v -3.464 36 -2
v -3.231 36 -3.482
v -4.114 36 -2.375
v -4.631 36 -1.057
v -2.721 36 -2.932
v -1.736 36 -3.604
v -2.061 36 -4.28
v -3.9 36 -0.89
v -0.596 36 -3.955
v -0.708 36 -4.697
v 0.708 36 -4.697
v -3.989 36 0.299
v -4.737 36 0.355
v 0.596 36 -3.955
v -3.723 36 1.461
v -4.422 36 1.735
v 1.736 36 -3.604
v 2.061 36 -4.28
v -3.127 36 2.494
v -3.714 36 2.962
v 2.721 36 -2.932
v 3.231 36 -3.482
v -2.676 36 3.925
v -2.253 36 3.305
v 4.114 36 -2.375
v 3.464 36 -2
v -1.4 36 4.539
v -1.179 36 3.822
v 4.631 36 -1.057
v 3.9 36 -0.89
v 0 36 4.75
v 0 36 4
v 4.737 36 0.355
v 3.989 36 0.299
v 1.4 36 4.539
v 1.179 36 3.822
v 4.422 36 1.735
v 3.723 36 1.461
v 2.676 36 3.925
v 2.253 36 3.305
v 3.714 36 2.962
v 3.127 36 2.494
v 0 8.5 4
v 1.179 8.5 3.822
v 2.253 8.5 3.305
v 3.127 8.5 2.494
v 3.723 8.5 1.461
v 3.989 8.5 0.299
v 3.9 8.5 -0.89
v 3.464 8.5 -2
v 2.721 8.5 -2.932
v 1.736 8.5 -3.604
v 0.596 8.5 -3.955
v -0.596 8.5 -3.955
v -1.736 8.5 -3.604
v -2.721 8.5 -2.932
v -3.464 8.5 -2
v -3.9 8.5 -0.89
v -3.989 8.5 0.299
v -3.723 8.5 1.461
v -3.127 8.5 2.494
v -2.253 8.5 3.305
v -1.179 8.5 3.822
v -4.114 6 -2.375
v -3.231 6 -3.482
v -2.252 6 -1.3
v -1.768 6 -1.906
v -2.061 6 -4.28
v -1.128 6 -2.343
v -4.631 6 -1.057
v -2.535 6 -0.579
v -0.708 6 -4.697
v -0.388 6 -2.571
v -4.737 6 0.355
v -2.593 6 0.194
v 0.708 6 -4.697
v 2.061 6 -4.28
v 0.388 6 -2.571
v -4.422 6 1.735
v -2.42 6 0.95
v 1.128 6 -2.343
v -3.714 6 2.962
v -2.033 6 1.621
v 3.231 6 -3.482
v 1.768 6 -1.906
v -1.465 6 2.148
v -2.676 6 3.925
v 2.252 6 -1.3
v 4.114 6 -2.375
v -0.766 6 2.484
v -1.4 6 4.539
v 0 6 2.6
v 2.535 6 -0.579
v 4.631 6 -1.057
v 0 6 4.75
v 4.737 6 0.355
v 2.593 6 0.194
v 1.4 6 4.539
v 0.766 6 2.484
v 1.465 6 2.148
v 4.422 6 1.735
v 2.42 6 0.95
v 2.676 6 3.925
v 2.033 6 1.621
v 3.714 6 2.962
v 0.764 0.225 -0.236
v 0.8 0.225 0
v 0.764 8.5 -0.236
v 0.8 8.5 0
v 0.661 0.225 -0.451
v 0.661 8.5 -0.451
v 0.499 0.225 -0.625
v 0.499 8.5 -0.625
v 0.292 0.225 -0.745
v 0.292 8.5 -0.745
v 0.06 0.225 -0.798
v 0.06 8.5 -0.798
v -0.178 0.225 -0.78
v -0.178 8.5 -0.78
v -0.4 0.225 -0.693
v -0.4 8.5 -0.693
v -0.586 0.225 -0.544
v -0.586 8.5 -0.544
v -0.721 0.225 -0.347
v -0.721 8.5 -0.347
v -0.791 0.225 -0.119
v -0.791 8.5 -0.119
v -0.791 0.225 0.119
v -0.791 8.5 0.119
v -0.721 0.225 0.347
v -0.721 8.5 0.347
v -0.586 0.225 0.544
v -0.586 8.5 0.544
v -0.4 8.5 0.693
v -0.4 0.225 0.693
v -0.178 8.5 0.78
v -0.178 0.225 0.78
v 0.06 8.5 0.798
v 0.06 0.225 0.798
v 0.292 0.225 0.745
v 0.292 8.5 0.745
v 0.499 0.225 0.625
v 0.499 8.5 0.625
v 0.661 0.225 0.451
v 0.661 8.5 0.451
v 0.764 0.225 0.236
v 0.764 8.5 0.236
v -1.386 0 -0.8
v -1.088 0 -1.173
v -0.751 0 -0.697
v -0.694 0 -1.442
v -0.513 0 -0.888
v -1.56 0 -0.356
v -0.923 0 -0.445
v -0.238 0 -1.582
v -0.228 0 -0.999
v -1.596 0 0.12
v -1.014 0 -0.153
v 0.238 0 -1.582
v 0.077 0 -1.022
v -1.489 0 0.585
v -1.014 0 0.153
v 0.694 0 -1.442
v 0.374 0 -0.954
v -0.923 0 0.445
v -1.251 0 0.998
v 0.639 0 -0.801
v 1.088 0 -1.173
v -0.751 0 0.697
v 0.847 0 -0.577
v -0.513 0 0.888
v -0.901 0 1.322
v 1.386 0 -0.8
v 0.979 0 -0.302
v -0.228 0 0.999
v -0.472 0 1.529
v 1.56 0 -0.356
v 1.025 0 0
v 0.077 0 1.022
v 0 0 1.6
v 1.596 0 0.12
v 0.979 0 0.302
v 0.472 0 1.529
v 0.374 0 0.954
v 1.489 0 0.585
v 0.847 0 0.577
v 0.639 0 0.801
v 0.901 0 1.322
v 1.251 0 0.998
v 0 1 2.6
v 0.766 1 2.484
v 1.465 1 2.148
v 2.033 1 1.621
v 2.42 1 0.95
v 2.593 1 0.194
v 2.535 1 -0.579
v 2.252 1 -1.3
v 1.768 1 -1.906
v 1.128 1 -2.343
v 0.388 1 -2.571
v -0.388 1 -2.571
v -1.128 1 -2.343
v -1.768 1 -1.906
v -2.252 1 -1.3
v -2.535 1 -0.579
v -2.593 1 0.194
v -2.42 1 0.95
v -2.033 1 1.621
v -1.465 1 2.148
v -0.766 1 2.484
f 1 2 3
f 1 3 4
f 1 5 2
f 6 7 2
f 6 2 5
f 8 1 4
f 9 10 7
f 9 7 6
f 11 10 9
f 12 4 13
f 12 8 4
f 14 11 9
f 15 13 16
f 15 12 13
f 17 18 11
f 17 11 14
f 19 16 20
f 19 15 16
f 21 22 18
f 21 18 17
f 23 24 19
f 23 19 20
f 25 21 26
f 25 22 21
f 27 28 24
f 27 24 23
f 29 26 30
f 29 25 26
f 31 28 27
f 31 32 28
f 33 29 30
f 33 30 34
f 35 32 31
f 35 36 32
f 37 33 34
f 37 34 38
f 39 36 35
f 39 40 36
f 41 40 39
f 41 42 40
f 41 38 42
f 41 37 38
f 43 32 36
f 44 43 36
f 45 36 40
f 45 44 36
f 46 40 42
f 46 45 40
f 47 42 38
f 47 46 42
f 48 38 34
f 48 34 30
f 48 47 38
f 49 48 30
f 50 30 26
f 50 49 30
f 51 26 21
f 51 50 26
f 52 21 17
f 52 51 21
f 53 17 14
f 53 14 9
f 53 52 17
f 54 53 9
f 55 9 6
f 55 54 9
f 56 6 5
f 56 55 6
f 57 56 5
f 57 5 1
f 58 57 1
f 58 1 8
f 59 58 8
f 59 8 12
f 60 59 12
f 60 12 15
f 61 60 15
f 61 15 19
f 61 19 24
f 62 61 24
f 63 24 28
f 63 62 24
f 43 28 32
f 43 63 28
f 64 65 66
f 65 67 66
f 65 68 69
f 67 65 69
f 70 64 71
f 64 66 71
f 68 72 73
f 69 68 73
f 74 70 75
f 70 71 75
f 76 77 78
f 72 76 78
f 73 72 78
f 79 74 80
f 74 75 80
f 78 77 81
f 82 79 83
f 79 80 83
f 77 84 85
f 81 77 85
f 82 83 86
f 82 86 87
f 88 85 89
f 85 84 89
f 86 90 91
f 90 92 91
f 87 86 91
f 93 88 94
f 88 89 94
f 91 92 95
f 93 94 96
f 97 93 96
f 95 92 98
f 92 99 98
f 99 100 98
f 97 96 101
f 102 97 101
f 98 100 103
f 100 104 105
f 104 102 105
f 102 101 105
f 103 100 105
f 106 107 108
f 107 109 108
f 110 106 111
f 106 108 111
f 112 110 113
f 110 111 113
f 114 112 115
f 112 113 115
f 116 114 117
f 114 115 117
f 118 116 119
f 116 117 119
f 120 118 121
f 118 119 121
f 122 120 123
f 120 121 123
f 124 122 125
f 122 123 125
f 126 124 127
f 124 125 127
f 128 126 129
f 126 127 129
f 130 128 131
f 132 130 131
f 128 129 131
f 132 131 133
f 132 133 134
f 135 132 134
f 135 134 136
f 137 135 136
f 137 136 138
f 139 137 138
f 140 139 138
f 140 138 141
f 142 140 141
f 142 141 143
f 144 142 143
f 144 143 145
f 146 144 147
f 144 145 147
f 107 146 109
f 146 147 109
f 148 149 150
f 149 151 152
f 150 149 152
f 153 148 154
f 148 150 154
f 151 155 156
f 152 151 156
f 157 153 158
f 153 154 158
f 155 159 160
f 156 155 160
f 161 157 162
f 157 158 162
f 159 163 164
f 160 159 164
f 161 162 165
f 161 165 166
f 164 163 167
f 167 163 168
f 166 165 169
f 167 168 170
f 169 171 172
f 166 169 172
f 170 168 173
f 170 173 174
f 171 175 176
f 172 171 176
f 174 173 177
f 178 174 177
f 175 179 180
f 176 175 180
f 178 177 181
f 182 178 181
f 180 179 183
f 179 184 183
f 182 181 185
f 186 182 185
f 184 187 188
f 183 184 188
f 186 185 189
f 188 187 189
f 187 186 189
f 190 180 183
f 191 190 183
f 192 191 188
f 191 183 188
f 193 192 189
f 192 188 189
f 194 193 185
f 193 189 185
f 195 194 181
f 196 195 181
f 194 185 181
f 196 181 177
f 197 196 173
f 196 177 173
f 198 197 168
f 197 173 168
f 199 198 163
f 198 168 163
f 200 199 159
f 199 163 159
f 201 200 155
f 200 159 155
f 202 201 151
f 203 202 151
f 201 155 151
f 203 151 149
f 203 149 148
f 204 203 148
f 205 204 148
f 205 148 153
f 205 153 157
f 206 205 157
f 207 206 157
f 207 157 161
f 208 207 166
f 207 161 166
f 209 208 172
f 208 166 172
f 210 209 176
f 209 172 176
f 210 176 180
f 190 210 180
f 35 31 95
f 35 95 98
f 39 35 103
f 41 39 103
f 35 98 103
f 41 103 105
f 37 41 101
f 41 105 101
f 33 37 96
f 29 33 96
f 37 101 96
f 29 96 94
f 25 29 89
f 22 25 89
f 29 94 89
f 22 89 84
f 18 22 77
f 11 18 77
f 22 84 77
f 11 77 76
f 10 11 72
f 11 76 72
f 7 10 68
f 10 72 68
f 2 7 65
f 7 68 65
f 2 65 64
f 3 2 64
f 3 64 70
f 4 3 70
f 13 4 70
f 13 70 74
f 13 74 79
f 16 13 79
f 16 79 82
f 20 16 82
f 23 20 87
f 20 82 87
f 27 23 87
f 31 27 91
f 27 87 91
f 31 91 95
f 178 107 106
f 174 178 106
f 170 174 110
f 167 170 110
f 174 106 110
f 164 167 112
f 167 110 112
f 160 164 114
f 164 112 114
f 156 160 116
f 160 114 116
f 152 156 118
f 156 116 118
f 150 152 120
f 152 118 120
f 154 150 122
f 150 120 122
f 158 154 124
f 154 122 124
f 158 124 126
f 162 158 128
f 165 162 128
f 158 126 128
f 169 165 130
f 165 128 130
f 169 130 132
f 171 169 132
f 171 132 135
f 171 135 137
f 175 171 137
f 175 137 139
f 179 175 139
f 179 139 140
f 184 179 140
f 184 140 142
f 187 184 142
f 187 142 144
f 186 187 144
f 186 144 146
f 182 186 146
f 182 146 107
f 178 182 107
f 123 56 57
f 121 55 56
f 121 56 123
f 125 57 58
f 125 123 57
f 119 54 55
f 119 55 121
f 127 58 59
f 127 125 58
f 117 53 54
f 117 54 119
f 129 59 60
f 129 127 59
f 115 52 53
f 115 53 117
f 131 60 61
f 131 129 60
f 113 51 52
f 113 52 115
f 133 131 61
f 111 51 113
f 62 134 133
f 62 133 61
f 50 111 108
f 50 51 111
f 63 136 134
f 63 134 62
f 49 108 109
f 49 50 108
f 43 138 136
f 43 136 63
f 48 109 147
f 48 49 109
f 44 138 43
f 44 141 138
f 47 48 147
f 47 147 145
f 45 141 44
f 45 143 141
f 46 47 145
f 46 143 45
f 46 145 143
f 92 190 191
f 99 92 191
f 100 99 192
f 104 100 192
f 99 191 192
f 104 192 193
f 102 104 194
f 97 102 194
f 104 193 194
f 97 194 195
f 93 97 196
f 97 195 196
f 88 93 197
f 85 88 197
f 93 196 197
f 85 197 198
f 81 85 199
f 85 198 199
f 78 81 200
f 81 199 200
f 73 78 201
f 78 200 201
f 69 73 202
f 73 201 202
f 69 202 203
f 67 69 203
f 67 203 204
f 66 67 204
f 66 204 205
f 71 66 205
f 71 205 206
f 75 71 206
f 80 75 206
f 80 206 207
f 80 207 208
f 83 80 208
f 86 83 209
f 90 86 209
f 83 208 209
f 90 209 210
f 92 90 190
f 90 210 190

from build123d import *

# Parameters (mm, degrees)
SKETCH1_R                   = 2.6
BOSS_EXTRUDE1_DEPTH         = 6
SKETCH2_R                   = 4.75
BOSS_EXTRUDE3_DEPTH         = 2.5
SKETCH3_R                   = 4.75
SKETCH3_R_2                 = 4
BOSS_EXTRUDE4_DEPTH         = 27.5
M2_TAPPED_HOLE1_D           = 1.6
M2_TAPPED_HOLE1_CSINK_D     = 2.05
M2_TAPPED_HOLE1_CSINK_ANGLE = 90
CHAMFER3_SIZE               = 1


with BuildPart() as part:
    # Sketch1 → Boss-Extrude1 (new body)
    with BuildSketch(Plane(origin=(0, 0, 0), x_dir=(1, 0, 0), z_dir=(0, 1, 0))):
        with Locations(Location((0, 0, 0), (0, 0, 270))):
            Circle(SKETCH1_R)
    extrude(amount=BOSS_EXTRUDE1_DEPTH)

    # Sketch2 → Boss-Extrude3 (add)
    with BuildSketch(Plane(origin=(0, 6, 0), x_dir=(1, 0, 0), z_dir=(0, 1, 0))):
        with Locations(Location((0, 0, 0), (0, 0, 270))):
            Circle(SKETCH2_R)
    extrude(amount=BOSS_EXTRUDE3_DEPTH)

    # Sketch3 → Boss-Extrude4 (add)
    with BuildSketch(Plane(origin=(0, 8.5, 0), x_dir=(1, 0, 0), z_dir=(0, 1, 0))):
        with Locations(Location((0, 0, 0), (0, 0, 270))):
            Circle(SKETCH3_R)
        with Locations(Location((0, 0, 0), (0, 0, 270))):
            Circle(SKETCH3_R_2, mode=Mode.SUBTRACT)
    extrude(amount=BOSS_EXTRUDE4_DEPTH)

    # M2 Tapped Hole1 (through all)
    with Locations(Plane(origin=(0, 0, 0), x_dir=(-1, 0, 0), z_dir=(0, -1, 0))):
        with Locations((0, 0)):
            CounterSinkHole(M2_TAPPED_HOLE1_D / 2, M2_TAPPED_HOLE1_CSINK_D / 2, counter_sink_angle=M2_TAPPED_HOLE1_CSINK_ANGLE)

    # Chamfer3
    chamfer3_edges = [part.edges().sort_by_distance(p)[0] for p in [
        (0, 0, -2.6),
    ]]
    chamfer(chamfer3_edges, length=CHAMFER3_SIZE)


solid = part.part
